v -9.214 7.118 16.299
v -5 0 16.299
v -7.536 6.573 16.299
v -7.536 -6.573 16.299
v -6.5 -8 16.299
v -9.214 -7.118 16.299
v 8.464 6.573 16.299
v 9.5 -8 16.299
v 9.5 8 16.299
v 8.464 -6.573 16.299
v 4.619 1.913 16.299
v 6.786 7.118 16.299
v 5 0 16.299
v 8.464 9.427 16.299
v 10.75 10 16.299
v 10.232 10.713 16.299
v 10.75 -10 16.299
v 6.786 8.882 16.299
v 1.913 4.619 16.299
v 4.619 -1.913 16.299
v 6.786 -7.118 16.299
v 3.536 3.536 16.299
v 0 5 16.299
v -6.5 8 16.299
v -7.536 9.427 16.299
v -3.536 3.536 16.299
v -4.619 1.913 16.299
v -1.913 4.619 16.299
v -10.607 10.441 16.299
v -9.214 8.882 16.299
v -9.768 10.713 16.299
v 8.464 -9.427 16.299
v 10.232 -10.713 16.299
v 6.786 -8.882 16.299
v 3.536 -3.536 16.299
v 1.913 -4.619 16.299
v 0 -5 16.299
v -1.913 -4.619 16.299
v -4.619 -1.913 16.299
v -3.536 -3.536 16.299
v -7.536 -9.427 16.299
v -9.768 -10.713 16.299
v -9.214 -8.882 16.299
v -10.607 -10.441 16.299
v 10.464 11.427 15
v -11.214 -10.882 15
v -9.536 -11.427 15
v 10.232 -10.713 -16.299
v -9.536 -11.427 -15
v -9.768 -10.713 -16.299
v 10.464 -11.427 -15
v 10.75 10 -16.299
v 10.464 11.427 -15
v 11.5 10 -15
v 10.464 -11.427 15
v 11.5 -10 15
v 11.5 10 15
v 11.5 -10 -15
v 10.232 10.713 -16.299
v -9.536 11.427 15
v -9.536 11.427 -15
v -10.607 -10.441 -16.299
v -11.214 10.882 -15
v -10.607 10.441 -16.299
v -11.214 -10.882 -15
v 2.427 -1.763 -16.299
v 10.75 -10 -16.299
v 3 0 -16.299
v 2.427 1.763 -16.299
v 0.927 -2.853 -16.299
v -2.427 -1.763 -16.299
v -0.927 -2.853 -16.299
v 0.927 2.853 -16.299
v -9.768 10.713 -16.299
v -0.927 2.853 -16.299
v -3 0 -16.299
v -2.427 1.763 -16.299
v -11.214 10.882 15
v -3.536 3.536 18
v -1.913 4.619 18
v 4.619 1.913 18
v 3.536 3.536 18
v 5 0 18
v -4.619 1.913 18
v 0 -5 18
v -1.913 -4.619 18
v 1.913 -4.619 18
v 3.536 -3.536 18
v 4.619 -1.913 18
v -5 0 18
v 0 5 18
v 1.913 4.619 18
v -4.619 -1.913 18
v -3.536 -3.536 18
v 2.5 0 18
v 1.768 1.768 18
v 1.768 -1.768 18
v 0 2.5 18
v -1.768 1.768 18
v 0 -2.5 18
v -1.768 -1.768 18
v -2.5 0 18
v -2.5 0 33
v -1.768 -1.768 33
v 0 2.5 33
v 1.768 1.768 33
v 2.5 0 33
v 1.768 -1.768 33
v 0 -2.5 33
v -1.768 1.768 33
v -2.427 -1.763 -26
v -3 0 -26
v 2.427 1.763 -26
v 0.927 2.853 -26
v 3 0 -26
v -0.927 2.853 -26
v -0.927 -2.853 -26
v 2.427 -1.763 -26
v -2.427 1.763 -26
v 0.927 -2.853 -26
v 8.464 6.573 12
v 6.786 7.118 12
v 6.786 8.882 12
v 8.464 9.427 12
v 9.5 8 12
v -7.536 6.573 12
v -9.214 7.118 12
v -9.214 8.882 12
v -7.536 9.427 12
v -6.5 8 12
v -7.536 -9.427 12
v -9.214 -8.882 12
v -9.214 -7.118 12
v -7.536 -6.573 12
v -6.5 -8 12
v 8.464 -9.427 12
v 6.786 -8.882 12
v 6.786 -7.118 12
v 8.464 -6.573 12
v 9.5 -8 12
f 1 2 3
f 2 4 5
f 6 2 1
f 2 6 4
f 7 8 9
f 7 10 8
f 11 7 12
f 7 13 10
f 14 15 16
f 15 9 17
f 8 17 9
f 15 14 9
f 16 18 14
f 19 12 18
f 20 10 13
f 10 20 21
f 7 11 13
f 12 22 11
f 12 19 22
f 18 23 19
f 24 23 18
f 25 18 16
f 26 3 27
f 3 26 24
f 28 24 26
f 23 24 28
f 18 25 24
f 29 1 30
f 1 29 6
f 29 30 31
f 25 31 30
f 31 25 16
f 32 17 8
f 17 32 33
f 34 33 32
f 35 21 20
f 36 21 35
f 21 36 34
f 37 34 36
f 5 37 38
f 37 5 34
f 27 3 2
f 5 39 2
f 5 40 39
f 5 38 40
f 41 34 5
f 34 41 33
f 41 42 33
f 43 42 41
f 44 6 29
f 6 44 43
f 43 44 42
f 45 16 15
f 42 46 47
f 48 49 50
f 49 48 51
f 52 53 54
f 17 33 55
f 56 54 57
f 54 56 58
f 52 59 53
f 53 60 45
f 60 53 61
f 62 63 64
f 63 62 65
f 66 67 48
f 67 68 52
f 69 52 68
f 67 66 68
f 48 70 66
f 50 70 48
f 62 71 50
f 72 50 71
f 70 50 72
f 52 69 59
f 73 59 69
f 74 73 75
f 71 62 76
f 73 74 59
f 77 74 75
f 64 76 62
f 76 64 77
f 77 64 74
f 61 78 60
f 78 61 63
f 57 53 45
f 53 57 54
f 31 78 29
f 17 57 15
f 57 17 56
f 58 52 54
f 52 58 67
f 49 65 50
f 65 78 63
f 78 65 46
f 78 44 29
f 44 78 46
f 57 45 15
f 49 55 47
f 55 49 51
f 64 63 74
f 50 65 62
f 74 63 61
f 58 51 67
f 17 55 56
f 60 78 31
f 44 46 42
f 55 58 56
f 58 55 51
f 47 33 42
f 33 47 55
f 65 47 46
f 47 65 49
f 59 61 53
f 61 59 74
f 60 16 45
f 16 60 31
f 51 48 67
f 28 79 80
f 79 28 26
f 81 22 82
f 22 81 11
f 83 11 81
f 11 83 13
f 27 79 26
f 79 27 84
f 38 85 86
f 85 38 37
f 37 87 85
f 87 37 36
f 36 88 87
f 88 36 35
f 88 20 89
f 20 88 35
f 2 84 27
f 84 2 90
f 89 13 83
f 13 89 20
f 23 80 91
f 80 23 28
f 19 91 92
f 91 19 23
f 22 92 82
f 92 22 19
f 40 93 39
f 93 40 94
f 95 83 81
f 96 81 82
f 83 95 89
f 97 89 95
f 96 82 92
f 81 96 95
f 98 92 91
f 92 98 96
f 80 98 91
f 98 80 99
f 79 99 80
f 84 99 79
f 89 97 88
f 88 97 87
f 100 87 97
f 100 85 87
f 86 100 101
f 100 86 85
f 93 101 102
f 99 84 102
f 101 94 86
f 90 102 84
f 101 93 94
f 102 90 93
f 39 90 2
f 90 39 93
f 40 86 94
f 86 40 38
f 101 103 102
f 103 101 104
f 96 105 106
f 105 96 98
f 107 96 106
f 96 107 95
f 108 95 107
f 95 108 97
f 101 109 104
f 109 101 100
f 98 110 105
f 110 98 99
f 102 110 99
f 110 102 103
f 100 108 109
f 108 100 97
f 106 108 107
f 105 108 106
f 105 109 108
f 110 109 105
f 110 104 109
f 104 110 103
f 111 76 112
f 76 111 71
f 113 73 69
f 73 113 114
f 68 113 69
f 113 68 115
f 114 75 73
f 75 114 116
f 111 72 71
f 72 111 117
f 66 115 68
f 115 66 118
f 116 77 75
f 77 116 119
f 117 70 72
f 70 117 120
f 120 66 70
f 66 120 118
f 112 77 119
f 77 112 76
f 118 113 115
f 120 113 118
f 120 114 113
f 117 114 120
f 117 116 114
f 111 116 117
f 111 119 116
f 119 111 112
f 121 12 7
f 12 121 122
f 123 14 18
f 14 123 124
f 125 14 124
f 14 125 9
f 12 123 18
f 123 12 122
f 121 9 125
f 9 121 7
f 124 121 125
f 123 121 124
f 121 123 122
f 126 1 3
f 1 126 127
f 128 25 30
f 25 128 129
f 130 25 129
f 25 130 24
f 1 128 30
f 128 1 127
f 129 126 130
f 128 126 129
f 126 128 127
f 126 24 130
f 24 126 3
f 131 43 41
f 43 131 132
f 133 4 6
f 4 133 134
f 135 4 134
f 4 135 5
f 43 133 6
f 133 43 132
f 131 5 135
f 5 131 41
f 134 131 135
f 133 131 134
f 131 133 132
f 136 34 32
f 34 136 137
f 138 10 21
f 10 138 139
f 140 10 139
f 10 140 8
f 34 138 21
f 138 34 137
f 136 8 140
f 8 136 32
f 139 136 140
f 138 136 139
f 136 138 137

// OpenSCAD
// Parameters
face_W = 20.0; //[10.0:40.0:0.5]
face_H = 20.0; //[10.0:40.0:0.5]
body_L = 30.0; //[15.0:60.0:0.5]
body_W = 20.0; //[10.0:40.0:0.5]
body_H = 20.0; //[10.0:40.0:0.5]
face_thk = 2.0; //[1.0:6.0:0.25]
shaft_d = 5.0; //[2.5:10.0:0.25]
shaft_L = 15.0; //[7.5:30.0:0.5]
mount_spacing = 16.0; //[8.0:32.0:0.5]
mount_hole_d = 3.0; //[1.5:6.0:0.25]
boss_d = 10.0; //[5.0:20.0:0.5]
boss_thk = 2.0; //[1.0:6.0:0.25]
rear_cap_thk = 2.0; //[1.0:6.0:0.25]
wire_exit_d = 6.0; //[3.0:12.0:0.5]
wire_exit_L = 10.0; //[5.0:25.0:0.5]
fillet_r = 1.5; //[0.5:4.0:0.25]
nameplate_W = 12.0; //[6.0:24.0:0.5]
nameplate_H = 8.0; //[4.0:16.0:0.5]
nameplate_thk = 0.6; //[0.3:2.0:0.1]
overlap = 1.0; //[0.5:2.0:0.1]

// Base Shapes
module motor_body_raw() {
  cube([body_W, body_H, body_L], center=true);
}

module corner_fillet_sphere() {
  sphere(r=fillet_r, center=true);
}

module front_face() {
  cube([face_W, face_H, face_thk], center=true);
}

module shaft_boss() {
  cylinder(h=boss_thk, r=boss_d/2, center=true);
}

module output_shaft() {
  cylinder(h=shaft_L, r=shaft_d/2, center=true);
}

module rear_cap() {
  cube([body_W, body_H, rear_cap_thk], center=true);
}

module wire_exit() {
  cylinder(h=wire_exit_L, r=wire_exit_d/2, center=true);
}

module nameplate_detail() {
  cube([nameplate_W, nameplate_H, nameplate_thk], center=true);
}

module mount_hole() {
  cylinder(h=face_thk + boss_thk + overlap*2, r=mount_hole_d/2, center=true);
}

// Operations
module motor_body_fillet() {
  minkowski() {
    motor_body_raw();
    corner_fillet_sphere();
  }
}

module mounting_holes_pattern() {
  union() {
    translate([mount_spacing/2, mount_spacing/2, 0]) mount_hole();
    translate([-mount_spacing/2, mount_spacing/2, 0]) mount_hole();
    translate([-mount_spacing/2, -mount_spacing/2, 0]) mount_hole();
    translate([mount_spacing/2, -mount_spacing/2, 0]) mount_hole();
  }
}

module motor_solid_preholes() {
  union() {
    motor_body_fillet();
    translate([0, 0, body_L/2 + face_thk/2 - overlap]) front_face();
    translate([0, 0, body_L/2 + face_thk + boss_thk/2 - overlap]) shaft_boss();
    translate([0, 0, body_L/2 + face_thk + boss_thk + shaft_L/2 - overlap]) output_shaft();
    translate([0, 0, -body_L/2 - rear_cap_thk/2 + overlap]) rear_cap();
    translate([0, 0, -body_L/2 - rear_cap_thk - wire_exit_L/2 + overlap]) wire_exit();
    translate([0, 0, -body_L/2 + nameplate_thk/2 - overlap]) nameplate_detail();
  }
}

module motor_complete() {
  difference() {
    motor_solid_preholes();
    translate([0, 0, body_L/2 + face_thk/2 - overlap]) mounting_holes_pattern();
  }
}

// Final Output
motor_complete();
